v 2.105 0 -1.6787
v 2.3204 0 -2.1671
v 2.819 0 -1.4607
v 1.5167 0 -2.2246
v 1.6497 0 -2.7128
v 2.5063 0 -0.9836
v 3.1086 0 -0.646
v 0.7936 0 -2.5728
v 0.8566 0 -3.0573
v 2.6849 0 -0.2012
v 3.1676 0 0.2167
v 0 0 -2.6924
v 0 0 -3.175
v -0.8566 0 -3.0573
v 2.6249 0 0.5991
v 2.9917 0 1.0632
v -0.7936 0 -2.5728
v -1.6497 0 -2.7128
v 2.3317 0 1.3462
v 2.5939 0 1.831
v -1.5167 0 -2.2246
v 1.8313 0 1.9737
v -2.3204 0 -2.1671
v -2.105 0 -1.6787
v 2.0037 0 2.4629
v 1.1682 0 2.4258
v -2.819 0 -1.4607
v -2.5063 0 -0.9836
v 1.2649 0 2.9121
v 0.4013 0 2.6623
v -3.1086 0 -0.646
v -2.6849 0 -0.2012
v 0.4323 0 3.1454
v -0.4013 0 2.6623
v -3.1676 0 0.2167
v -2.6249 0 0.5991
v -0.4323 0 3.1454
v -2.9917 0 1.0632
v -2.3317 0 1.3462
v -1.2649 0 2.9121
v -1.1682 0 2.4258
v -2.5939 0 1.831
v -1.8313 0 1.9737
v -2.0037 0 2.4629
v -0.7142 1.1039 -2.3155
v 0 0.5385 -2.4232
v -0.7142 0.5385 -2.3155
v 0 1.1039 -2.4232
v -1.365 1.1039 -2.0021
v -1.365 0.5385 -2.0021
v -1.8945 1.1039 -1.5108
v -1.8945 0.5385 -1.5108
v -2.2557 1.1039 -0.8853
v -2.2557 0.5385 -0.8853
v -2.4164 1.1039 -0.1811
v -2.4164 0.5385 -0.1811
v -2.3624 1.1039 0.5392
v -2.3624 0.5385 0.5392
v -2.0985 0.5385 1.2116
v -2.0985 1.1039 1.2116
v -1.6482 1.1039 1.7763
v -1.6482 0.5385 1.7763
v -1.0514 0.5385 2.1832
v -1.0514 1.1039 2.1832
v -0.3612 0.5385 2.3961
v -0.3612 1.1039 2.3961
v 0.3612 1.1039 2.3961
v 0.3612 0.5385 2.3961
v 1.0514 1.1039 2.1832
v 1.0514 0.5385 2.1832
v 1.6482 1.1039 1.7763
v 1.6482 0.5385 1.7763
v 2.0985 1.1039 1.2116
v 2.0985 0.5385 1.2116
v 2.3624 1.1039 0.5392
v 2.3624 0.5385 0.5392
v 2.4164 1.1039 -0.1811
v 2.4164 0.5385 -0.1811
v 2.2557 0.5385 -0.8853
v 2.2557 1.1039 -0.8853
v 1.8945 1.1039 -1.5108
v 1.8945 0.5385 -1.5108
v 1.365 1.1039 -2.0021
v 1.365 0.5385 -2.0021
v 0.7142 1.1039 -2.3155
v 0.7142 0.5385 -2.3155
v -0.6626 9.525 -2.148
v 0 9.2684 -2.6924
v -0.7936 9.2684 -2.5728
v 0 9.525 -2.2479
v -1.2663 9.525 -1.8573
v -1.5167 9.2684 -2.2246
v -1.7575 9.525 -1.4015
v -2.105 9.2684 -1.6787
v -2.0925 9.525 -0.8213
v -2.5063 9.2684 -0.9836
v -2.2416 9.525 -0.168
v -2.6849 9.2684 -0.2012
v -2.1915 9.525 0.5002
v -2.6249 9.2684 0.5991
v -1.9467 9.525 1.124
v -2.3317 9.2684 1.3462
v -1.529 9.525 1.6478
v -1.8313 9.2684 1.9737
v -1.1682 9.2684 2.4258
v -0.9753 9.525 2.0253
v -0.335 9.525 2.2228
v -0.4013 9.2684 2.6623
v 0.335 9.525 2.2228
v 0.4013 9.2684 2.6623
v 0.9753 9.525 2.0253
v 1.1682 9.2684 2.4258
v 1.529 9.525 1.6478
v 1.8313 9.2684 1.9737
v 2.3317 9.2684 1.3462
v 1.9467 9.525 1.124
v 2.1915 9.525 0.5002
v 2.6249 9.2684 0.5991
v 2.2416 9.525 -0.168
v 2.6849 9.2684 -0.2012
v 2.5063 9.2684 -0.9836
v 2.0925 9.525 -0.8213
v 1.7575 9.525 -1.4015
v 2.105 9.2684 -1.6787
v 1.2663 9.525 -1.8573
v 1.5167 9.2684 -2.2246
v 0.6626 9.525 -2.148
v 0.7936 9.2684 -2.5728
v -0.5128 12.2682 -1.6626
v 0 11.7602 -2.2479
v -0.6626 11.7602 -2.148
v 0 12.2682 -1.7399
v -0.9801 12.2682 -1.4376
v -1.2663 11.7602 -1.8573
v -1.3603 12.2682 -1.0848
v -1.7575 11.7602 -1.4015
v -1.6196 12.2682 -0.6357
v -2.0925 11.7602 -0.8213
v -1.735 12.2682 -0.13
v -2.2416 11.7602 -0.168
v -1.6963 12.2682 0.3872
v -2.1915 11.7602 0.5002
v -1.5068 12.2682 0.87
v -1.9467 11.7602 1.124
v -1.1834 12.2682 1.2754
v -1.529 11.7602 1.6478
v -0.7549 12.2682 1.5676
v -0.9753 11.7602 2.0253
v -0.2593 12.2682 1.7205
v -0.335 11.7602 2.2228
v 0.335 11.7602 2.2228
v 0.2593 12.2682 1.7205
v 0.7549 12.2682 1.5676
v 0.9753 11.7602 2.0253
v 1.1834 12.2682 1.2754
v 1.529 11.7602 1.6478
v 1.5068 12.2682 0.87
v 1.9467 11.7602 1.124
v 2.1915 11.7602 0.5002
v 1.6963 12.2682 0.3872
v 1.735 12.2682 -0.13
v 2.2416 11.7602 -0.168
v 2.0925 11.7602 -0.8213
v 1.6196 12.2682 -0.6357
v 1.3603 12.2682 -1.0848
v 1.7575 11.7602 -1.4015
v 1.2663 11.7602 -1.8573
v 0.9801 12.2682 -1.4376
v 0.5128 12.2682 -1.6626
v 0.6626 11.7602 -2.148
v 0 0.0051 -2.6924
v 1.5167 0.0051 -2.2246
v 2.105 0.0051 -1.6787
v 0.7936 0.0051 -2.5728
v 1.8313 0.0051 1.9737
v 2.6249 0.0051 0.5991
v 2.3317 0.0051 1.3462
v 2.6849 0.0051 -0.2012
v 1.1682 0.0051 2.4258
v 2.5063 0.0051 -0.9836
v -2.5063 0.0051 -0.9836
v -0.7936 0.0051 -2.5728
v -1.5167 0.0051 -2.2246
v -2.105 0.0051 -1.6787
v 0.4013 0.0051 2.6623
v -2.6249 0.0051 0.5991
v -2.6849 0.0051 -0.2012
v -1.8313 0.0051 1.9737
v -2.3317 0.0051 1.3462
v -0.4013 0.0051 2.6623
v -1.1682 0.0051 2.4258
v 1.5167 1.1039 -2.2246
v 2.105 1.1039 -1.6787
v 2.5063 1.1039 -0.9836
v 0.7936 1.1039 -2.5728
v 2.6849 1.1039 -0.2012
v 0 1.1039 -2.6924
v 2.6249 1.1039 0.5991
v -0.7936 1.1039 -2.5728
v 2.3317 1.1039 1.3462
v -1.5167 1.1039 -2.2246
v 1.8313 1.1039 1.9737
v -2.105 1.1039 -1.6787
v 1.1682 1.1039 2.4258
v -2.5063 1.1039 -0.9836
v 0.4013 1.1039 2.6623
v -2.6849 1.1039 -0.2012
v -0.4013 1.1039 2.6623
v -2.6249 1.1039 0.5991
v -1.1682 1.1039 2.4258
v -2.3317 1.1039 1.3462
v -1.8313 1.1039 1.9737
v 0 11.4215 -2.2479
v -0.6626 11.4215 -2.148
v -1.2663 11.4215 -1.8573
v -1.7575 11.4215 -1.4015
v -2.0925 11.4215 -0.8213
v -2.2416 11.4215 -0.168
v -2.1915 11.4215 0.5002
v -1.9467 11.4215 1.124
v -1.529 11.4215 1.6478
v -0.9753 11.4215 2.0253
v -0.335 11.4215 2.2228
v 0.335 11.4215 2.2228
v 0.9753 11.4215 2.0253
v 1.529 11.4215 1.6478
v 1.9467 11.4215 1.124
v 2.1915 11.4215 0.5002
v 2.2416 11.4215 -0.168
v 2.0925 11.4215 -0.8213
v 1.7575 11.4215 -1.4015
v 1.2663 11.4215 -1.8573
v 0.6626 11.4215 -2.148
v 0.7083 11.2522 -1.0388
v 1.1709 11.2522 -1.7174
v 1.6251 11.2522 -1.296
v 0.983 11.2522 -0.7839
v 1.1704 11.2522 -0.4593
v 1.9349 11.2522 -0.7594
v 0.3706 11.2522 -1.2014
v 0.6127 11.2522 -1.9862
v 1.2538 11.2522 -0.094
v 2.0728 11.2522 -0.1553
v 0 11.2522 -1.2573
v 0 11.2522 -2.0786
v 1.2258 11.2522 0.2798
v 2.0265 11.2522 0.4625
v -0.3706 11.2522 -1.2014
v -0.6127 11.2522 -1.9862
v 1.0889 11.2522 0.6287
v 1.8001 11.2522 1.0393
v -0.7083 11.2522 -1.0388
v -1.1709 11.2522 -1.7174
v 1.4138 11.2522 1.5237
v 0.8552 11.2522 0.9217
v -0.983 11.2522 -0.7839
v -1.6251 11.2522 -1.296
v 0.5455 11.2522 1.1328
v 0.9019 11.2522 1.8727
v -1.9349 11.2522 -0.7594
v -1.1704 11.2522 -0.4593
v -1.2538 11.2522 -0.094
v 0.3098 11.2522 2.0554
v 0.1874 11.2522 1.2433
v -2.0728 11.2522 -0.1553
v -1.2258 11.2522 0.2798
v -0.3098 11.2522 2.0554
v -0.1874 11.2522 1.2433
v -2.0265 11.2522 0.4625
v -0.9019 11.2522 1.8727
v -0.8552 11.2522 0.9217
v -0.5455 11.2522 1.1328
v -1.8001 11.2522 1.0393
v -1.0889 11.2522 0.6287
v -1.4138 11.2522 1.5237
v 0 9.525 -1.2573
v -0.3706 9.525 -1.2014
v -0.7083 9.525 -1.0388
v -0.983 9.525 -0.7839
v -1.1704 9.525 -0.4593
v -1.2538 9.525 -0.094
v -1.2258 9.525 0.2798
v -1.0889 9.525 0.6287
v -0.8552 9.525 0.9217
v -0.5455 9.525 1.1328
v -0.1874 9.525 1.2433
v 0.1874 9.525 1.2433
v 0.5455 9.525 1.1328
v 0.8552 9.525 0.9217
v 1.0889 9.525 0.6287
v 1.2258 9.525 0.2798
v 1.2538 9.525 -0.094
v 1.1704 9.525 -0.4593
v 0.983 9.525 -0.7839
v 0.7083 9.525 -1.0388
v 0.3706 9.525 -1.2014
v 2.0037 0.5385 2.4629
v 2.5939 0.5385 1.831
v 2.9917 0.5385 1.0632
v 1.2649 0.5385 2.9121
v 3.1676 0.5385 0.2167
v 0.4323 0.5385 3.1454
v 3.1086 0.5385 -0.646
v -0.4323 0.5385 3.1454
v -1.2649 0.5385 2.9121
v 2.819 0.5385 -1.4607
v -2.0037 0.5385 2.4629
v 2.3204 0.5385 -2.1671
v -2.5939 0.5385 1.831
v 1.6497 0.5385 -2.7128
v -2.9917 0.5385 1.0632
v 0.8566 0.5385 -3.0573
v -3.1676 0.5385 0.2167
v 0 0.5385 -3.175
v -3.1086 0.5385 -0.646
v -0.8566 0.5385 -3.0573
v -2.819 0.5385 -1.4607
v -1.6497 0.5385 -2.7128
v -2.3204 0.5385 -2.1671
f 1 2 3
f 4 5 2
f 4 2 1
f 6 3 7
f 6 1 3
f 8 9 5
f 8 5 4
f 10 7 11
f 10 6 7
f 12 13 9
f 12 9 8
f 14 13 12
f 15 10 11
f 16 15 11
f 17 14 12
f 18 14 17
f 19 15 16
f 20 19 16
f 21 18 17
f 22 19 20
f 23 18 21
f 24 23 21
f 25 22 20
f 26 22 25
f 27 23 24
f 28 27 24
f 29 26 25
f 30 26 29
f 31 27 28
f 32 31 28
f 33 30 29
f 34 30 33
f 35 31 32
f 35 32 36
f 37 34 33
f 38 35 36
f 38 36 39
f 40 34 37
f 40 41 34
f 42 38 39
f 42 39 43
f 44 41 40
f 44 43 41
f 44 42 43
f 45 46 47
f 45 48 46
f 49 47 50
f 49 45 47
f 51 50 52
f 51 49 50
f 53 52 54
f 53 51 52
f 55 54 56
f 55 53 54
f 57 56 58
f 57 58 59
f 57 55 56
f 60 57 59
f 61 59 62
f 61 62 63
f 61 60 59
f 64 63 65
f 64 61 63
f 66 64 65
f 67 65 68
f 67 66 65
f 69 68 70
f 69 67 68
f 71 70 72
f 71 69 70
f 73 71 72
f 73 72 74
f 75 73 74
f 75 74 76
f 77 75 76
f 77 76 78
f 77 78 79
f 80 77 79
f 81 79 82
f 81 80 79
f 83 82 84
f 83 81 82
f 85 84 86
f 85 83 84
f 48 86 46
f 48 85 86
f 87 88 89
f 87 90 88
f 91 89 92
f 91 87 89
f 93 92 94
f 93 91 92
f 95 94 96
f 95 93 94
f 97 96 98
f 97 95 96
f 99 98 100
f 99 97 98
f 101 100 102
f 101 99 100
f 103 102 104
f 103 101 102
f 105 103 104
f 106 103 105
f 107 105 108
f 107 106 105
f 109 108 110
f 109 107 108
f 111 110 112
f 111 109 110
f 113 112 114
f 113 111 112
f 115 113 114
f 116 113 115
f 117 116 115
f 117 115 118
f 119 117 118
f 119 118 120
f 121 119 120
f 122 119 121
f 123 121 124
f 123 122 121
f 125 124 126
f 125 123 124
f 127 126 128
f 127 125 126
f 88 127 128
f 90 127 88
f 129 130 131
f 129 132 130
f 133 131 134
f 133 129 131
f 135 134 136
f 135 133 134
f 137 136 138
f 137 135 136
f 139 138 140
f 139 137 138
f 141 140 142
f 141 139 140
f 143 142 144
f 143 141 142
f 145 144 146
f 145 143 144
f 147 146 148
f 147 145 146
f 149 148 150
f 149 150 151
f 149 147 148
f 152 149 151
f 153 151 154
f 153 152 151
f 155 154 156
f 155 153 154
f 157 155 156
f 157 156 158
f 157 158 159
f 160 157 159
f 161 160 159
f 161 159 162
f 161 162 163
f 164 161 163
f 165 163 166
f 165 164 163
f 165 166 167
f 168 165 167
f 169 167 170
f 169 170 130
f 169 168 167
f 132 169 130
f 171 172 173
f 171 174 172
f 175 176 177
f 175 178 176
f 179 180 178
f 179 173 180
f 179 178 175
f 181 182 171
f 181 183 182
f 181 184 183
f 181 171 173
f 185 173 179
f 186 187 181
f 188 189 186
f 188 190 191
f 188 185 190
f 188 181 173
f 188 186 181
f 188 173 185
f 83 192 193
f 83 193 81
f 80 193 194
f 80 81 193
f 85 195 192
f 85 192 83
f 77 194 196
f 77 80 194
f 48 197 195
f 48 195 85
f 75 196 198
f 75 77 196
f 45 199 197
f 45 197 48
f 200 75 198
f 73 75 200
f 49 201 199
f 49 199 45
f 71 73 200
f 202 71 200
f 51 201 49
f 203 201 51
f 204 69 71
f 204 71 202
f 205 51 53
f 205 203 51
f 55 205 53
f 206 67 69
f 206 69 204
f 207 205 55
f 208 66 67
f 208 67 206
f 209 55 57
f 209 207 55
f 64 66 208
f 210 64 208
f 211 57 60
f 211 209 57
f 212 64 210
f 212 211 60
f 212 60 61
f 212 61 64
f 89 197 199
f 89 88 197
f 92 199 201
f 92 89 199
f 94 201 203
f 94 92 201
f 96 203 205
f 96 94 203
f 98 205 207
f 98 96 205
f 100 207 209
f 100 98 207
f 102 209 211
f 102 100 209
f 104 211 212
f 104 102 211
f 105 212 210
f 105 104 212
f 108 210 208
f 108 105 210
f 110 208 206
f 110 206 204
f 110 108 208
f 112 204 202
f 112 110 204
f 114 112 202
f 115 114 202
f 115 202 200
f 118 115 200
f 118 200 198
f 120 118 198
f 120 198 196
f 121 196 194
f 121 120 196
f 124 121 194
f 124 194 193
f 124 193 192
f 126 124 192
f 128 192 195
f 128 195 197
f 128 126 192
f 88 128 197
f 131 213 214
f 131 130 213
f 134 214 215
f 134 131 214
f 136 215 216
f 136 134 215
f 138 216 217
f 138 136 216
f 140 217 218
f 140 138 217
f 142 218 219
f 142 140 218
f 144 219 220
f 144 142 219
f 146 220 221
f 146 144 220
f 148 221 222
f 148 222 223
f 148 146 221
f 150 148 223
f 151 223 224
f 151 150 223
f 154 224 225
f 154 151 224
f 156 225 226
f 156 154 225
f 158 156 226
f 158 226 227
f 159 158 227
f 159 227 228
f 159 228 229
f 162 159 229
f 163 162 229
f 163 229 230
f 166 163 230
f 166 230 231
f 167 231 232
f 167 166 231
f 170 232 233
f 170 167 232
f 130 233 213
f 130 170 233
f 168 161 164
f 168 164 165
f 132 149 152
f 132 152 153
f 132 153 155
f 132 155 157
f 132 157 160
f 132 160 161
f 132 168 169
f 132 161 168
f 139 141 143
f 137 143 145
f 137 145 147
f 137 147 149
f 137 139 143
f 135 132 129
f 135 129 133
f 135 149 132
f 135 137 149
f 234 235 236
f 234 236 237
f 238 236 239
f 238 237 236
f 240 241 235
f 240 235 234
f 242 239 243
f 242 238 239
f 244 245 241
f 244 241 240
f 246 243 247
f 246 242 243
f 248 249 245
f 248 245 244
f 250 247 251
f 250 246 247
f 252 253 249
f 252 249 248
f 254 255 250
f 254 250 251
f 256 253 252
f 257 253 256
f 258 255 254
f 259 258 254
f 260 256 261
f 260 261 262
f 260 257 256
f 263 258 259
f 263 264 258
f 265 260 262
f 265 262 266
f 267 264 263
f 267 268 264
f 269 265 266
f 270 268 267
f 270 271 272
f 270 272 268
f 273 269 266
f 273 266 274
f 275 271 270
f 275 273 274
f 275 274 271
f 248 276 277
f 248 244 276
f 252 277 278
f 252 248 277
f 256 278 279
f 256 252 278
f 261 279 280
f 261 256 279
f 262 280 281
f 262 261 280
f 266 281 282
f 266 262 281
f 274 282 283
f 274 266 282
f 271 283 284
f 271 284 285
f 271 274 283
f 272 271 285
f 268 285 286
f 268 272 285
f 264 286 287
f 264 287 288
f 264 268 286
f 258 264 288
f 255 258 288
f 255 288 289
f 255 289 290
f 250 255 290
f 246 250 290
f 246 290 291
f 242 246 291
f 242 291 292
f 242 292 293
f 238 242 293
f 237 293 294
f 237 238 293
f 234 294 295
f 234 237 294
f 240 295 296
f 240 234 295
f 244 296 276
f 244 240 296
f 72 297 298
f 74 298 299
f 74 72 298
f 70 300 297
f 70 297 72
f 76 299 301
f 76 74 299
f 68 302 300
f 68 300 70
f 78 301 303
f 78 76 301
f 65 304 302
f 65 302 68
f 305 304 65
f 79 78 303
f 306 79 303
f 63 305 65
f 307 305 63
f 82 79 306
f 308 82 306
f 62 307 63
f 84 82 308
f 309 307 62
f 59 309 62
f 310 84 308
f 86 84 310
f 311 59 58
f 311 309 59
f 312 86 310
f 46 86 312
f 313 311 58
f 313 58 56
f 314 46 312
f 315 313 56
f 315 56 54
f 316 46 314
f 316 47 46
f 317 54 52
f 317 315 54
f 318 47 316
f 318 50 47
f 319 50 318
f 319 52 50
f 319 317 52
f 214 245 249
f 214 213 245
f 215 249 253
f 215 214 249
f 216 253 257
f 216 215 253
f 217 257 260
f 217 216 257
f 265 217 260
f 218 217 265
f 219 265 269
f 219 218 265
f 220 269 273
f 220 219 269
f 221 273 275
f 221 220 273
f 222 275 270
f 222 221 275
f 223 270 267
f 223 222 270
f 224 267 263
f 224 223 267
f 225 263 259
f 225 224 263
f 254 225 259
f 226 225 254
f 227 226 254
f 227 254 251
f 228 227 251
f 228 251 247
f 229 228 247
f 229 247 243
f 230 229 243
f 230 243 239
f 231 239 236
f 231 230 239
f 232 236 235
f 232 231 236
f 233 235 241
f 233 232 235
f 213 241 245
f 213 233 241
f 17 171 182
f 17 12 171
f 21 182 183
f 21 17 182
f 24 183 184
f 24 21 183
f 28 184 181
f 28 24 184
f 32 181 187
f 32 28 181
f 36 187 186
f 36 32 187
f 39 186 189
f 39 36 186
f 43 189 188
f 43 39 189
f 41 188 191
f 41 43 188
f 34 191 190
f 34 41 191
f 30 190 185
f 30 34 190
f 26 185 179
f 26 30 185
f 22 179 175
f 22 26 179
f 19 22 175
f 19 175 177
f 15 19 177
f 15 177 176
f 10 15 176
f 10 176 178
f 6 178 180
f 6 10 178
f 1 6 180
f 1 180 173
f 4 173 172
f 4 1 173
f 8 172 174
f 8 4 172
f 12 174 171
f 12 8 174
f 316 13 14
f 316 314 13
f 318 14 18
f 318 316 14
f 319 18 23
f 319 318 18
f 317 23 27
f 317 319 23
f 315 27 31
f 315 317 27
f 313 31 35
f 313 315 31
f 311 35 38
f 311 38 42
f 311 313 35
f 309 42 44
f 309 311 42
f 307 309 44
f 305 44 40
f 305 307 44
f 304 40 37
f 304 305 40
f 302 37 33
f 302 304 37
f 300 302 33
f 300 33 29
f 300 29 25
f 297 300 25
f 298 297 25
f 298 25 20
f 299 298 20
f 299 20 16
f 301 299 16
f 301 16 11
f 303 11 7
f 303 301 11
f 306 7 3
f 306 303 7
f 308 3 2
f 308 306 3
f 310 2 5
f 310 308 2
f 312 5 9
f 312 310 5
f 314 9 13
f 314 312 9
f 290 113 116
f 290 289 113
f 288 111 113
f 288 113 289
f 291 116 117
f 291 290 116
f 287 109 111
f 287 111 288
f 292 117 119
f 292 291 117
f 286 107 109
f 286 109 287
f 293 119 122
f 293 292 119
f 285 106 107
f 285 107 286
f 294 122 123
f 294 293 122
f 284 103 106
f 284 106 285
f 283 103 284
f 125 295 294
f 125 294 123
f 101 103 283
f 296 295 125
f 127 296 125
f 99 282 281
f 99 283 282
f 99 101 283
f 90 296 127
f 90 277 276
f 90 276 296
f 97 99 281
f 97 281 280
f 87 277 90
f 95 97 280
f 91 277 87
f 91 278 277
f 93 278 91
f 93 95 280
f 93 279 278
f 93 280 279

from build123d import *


with BuildPart() as part:
    # BodySke → Body (revolve)
    with BuildSketch(Plane.XY, mode=Mode.PRIVATE) as body_sk:
        Polygon((2.6924, 0), (3.175, 0), (3.175, 0.53848), (2.42316, 0.53848), (2.42316, 1.103884), (2.6924, 1.103884), (2.6924, 9.268367805), (2.2479, 9.525), (1.2573, 9.525), (1.2573, 11.2522), (2.078566667, 11.2522), (2.2479, 11.421533333), (2.2479, 11.7602), (1.7399, 12.2682), (0, 12.2682), (0, 0.00508), (2.6924, 0.00508), align=None)
    revolve(body_sk.sketch.rotate(Axis((0, 0, 0), (0, 1, 0)), 90), axis=Axis((0, 0, 0), (0, 1, 0)))


solid = part.part
